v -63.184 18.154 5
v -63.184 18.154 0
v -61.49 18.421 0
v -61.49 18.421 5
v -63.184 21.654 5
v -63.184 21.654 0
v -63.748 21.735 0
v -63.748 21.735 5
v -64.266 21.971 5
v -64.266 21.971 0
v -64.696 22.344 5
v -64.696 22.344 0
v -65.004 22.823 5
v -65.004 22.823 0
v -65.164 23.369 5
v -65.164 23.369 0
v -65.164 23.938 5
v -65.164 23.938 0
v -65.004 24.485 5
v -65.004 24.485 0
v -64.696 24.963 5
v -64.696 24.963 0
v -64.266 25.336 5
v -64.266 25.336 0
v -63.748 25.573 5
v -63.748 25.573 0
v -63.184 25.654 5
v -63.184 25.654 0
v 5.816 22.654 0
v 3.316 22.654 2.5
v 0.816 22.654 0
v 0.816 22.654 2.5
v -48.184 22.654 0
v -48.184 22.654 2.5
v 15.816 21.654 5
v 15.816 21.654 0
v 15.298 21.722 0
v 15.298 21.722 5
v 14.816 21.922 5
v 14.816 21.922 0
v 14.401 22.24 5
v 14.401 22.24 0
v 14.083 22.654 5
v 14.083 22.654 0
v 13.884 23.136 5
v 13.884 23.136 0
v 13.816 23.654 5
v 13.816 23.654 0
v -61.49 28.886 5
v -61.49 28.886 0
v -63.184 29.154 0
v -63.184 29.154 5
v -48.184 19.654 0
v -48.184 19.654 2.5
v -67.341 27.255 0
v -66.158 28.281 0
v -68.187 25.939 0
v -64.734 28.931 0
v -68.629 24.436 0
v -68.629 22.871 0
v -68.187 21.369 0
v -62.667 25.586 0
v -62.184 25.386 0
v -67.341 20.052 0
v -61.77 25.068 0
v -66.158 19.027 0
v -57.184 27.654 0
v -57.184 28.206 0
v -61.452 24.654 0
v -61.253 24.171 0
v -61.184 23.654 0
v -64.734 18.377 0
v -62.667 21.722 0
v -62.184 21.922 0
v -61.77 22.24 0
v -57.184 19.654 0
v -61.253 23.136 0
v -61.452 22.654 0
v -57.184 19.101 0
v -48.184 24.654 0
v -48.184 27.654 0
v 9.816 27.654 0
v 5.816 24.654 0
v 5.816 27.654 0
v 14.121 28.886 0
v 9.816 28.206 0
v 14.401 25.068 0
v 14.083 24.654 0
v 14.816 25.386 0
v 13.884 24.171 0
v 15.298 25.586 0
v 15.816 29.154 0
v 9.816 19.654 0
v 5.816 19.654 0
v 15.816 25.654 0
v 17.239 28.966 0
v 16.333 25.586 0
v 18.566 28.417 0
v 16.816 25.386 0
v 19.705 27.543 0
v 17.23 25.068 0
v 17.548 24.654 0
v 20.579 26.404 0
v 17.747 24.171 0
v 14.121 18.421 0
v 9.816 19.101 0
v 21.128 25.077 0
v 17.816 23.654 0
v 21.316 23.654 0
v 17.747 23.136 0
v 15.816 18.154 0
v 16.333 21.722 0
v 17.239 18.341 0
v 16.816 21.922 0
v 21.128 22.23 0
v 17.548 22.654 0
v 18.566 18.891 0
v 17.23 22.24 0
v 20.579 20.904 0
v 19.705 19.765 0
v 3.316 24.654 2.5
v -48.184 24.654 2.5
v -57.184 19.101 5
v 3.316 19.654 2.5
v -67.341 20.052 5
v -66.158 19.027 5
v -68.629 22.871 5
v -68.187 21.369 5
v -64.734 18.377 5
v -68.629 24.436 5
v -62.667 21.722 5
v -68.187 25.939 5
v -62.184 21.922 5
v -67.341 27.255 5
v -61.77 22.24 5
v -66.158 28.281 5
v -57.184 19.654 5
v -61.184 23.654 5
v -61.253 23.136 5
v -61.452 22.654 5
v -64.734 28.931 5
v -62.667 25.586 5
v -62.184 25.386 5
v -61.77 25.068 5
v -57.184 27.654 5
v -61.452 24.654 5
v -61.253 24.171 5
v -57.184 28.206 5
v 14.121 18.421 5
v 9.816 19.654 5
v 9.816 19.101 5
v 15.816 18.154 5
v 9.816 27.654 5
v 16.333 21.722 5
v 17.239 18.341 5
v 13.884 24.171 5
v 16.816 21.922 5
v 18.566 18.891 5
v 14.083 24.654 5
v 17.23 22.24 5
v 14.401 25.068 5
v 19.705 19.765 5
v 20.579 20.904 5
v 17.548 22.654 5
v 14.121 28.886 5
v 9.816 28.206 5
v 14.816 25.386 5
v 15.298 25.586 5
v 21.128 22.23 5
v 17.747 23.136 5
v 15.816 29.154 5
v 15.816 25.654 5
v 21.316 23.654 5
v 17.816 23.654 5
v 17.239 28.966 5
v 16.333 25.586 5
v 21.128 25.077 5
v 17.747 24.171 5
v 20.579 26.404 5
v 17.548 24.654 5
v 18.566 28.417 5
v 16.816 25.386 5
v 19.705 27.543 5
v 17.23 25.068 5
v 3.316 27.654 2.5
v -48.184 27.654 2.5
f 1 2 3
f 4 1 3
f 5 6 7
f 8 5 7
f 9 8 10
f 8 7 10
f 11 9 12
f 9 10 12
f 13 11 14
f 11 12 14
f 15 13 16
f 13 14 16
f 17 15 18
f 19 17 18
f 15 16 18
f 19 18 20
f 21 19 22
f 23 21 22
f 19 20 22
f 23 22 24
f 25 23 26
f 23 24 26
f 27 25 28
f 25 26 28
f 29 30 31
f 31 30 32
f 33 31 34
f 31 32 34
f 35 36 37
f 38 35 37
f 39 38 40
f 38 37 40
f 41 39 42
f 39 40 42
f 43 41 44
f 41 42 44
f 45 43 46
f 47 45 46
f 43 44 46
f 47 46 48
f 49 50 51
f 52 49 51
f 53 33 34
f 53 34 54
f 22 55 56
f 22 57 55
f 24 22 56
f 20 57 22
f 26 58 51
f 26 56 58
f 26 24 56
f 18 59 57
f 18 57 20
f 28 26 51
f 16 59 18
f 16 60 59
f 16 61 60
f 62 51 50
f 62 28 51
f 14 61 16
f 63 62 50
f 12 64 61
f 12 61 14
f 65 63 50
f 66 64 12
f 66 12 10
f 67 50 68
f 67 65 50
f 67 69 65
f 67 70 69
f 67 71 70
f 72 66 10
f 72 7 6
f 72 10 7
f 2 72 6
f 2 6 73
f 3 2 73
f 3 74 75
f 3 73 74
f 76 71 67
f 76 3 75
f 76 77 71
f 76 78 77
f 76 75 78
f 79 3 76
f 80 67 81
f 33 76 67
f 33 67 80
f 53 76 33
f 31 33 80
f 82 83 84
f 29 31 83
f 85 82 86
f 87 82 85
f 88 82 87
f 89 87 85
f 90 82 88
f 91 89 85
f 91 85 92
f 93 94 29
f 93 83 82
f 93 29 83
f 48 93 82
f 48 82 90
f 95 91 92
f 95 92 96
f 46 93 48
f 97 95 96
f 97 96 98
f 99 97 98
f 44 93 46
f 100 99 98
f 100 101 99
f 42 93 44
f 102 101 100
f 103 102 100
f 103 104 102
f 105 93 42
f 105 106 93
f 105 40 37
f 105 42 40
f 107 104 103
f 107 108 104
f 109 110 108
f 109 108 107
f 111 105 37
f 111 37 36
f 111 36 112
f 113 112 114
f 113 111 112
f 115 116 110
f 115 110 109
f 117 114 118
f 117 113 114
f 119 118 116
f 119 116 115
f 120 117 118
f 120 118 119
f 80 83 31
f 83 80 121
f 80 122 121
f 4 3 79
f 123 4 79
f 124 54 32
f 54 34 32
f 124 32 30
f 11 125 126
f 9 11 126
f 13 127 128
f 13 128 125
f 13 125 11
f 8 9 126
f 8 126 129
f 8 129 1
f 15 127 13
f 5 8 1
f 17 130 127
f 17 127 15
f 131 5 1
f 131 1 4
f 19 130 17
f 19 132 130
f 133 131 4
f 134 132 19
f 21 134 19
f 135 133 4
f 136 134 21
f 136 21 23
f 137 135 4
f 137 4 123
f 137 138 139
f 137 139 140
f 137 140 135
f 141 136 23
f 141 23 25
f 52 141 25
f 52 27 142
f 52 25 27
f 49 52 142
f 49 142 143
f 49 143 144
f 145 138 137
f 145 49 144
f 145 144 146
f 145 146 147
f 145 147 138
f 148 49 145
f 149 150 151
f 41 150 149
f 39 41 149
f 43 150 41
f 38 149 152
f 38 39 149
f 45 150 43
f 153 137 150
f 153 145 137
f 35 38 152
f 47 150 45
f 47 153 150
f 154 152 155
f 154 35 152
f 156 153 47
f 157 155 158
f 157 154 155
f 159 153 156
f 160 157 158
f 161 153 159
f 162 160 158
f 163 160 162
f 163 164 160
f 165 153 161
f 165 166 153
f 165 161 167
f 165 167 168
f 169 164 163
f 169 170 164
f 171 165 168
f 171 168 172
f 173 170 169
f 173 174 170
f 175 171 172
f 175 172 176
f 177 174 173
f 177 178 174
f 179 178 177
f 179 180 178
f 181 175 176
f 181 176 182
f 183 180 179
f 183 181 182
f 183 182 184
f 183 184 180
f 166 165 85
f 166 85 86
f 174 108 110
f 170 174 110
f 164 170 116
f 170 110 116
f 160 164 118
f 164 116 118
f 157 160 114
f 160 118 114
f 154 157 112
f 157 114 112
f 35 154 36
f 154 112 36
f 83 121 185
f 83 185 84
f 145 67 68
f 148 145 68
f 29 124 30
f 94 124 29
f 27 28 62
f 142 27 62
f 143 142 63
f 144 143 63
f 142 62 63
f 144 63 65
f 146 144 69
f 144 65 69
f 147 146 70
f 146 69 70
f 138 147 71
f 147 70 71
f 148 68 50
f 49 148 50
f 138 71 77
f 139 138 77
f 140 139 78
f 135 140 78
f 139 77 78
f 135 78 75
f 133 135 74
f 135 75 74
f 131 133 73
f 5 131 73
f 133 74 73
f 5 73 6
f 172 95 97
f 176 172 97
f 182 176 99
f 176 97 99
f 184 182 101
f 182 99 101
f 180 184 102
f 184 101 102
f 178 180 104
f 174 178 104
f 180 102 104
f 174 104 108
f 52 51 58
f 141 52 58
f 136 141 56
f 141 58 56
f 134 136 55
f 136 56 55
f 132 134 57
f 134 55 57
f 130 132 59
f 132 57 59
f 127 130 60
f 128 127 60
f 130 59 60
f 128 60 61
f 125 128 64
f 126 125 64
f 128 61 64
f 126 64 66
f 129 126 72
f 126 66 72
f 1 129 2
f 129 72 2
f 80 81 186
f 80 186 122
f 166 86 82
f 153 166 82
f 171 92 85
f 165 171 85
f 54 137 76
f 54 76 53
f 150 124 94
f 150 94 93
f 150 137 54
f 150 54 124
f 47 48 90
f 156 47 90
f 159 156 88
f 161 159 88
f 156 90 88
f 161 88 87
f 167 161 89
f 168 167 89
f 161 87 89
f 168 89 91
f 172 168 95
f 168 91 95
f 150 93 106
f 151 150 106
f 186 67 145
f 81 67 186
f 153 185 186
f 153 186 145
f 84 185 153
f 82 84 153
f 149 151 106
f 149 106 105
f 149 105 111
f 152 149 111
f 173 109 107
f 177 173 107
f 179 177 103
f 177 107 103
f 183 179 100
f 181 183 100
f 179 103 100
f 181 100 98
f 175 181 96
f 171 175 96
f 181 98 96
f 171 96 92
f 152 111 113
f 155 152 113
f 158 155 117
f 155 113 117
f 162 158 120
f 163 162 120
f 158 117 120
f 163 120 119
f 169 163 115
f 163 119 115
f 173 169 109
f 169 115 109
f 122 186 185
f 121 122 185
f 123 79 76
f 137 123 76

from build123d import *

# Parameters (mm, degrees)
F0_W         = 60
F0_H         = 2
F1_DEPTH     = 5
F2_W         = 9
F2_H         = 3
F3_DEPTH     = 5
F4_W         = 49
F4_H         = 3
F5_DEPTH     = 2.5
F6_T4_DEPTH  = 15.8584149398
F6_T9_DEPTH  = 28.7168298797
F6_T15_DEPTH = 28.7168298797
F6_T21_DEPTH = 15.8584149398


# Not quite as in the source:
# - a fillet or chamfer that OpenCascade refuses, or shapes differently, is made with other operations: its cross-section is extruded or revolved along the edge and cut away or added


with BuildPart() as f1:
    # F0 (on Top) → F1 (new body)
    with BuildSketch(Plane.XY):
        with BuildLine():
            ThreePointArc((21.3155073225, 23.6537444443), (19.7045946191, 27.5428317408), (15.8155073225, 29.1537444443))
            Line((15.8155073225, 29.1537444443), (15.8155073225, 25.6537444443))
            ThreePointArc((15.8155073225, 25.6537444443), (17.2297208849, 25.0679580066), (17.8155073225, 23.6537444443))
            ThreePointArc((17.8155073225, 23.6537444443), (17.2297208849, 22.2395308819), (15.8155073225, 21.6537444443))
            Line((15.8155073225, 21.6537444443), (15.8155073225, 18.1537444443))
            ThreePointArc((15.8155073225, 18.1537444443), (19.7045946191, 19.7646571477), (21.3155073225, 23.6537444443))
        make_face()
        with BuildLine():
            Line((15.8155073225, 29.1537444443), (14.120912728, 28.8861768767))
            ThreePointArc((14.120912728, 28.8861768767), (11.3674588589, 26.8886887815), (10.3155073225, 23.6537444443))
            Line((10.3155073225, 23.6537444443), (13.8155073225, 23.6537444443))
            ThreePointArc((13.8155073225, 23.6537444443), (14.4012937602, 25.0679580066), (15.8155073225, 25.6537444443))
            Line((15.8155073225, 25.6537444443), (15.8155073225, 29.1537444443))
        make_face()
        with BuildLine():
            Line((13.8155073225, 23.6537444443), (10.3155073225, 23.6537444443))
            ThreePointArc((10.3155073225, 23.6537444443), (11.3674588589, 20.418800107), (14.120912728, 18.4213120118))
            Line((14.120912728, 18.4213120118), (15.8155073225, 18.1537444443))
            Line((15.8155073225, 18.1537444443), (15.8155073225, 21.6537444443))
            ThreePointArc((15.8155073225, 21.6537444443), (14.4012937602, 22.2395308819), (13.8155073225, 23.6537444443))
        make_face()
        with BuildLine():
            Line((14.120912728, 28.8861768767), (9.8155073225, 28.2063760232))
            Line((9.8155073225, 28.2063760232), (9.8155073225, 24.6537444443))
            Line((9.8155073225, 24.6537444443), (9.8155073225, 23.6537444443))
            Line((9.8155073225, 23.6537444443), (10.3155073225, 23.6537444443))
            ThreePointArc((10.3155073225, 23.6537444443), (11.3674588589, 26.8886887815), (14.120912728, 28.8861768767))
        make_face()
        with BuildLine():
            Line((10.3155073225, 23.6537444443), (9.8155073225, 23.6537444443))
            Line((9.8155073225, 23.6537444443), (9.8155073225, 22.6537444443))
            Line((9.8155073225, 22.6537444443), (9.8155073225, 19.1011128653))
            Line((9.8155073225, 19.1011128653), (14.120912728, 18.4213120118))
            ThreePointArc((14.120912728, 18.4213120118), (11.3674588589, 20.418800107), (10.3155073225, 23.6537444443))
        make_face()
        with Locations((-23.6844926775, 23.6537444443)):
            Rectangle(F0_W, F0_H)
        Polygon((9.8155073225, 24.6537444443), (6.3155073225, 24.6537444443), (6.3155073225, 22.6537444443), (9.8155073225, 22.6537444443), (9.8155073225, 23.6537444443), align=None)
        with BuildLine():
            ThreePointArc((-57.6844926775, 23.6537444443), (-58.7364442138, 26.8886887815), (-61.4898980829, 28.8861768767))
            Line((-61.4898980829, 28.8861768767), (-63.1844926775, 29.1537444443))
            Line((-63.1844926775, 29.1537444443), (-63.1844926775, 25.6537444443))
            ThreePointArc((-63.1844926775, 25.6537444443), (-61.7702791151, 25.0679580066), (-61.1844926775, 23.6537444443))
            Line((-61.1844926775, 23.6537444443), (-57.6844926775, 23.6537444443))
        make_face()
        with BuildLine():
            ThreePointArc((-61.4898980829, 18.4213120118), (-58.7364442138, 20.418800107), (-57.6844926775, 23.6537444443))
            Line((-57.6844926775, 23.6537444443), (-61.1844926775, 23.6537444443))
            ThreePointArc((-61.1844926775, 23.6537444443), (-61.7702791151, 22.2395308819), (-63.1844926775, 21.6537444443))
            Line((-63.1844926775, 21.6537444443), (-63.1844926775, 18.1537444443))
            Line((-63.1844926775, 18.1537444443), (-61.4898980829, 18.4213120118))
        make_face()
        with BuildLine():
            Line((-63.1844926775, 25.6537444443), (-63.1844926775, 29.1537444443))
            ThreePointArc((-63.1844926775, 29.1537444443), (-68.6844926775, 23.6537444443), (-63.1844926775, 18.1537444443))
            Line((-63.1844926775, 18.1537444443), (-63.1844926775, 21.6537444443))
            ThreePointArc((-63.1844926775, 21.6537444443), (-65.1844926775, 23.6537444443), (-63.1844926775, 25.6537444443))
        make_face()
        with BuildLine():
            Line((-57.1844926775, 24.6537444443), (-57.1844926775, 28.2063760232))
            Line((-57.1844926775, 28.2063760232), (-61.4898980829, 28.8861768767))
            ThreePointArc((-61.4898980829, 28.8861768767), (-58.7364442138, 26.8886887815), (-57.6844926775, 23.6537444443))
            Line((-57.6844926775, 23.6537444443), (-57.1844926775, 23.6537444443))
            Line((-57.1844926775, 23.6537444443), (-57.1844926775, 24.6537444443))
        make_face()
        with BuildLine():
            Line((-57.1844926775, 22.6537444443), (-57.1844926775, 23.6537444443))
            Line((-57.1844926775, 23.6537444443), (-57.6844926775, 23.6537444443))
            ThreePointArc((-57.6844926775, 23.6537444443), (-58.7364442138, 20.418800107), (-61.4898980829, 18.4213120118))
            Line((-61.4898980829, 18.4213120118), (-57.1844926775, 19.1011128653))
            Line((-57.1844926775, 19.1011128653), (-57.1844926775, 22.6537444443))
        make_face()
        Polygon((-53.6844926775, 22.6537444443), (-53.6844926775, 24.6537444443), (-57.1844926775, 24.6537444443), (-57.1844926775, 23.6537444443), (-57.1844926775, 22.6537444443), align=None)
    extrude(amount=F1_DEPTH)

    # F2 (on face) → F3 (join)
    with BuildSketch(Plane(origin=(0, 0, 0), x_dir=(1, 0, 0), z_dir=(0, 0, -1))):
        with Locations((5.3155073225, -21.1537444443)):
            Rectangle(F2_W, F2_H)
        with Locations((5.3155073225, -26.1537444443)):
            Rectangle(F2_W, F2_H)
        with Locations((-52.6844926775, -21.1537444443)):
            Rectangle(F2_W, F2_H)
        with Locations((-52.6844926775, -26.1537444443)):
            Rectangle(F2_W, F2_H)
    extrude(amount=-F3_DEPTH)

    # F4 (on face) → F5 (join)
    with BuildSketch(Plane.XY.offset(5)):
        with Locations((-23.6844926775, 21.1537444443)):
            Rectangle(F4_W, F4_H)
        with Locations((-23.6844926775, 26.1537444443)):
            Rectangle(F4_W, F4_H)
    extrude(amount=-F5_DEPTH)

    # F6: chamfer of 5 on 2 edges, made by hand


with BuildPart() as f6_tool2:
    # F6_s3 → F6_t4 (new body)
    with BuildSketch(Plane.XZ.offset(-6.7953295044)):
        Polygon((0.8155073225, 5), (5.8155073225, 0), (0.8155073225, 0), align=None)
    extrude(amount=-F6_T4_DEPTH)

    split(bisect_by=Plane.XY.offset(2.5), keep=Keep.BOTTOM)


with BuildPart() as f1_1:
    add(f1.part)

    # F6_t1: cut F6_tool2
    add(f6_tool2.part, mode=Mode.SUBTRACT)


with BuildPart() as f6_tool7:
    # F6_s8 → F6_t9 (new body)
    with BuildSketch(Plane.XZ.offset(-6.7953295044)):
        Polygon((0.8155073225, 5), (5.8155073225, 0), (0.8155073225, 0), align=None)
    extrude(amount=-F6_T9_DEPTH)

    split(bisect_by=Plane.XY.offset(2.5), keep=Keep.BOTTOM)

    split(bisect_by=Plane.XZ.offset(-24.6537444443), keep=Keep.BOTTOM)


with BuildPart() as f1_2:
    add(f1_1.part)

    # F6_t6: cut F6_tool7
    add(f6_tool7.part, mode=Mode.SUBTRACT)


with BuildPart() as f6_tool13:
    # F6_s14 → F6_t15 (new body)
    with BuildSketch(Plane.XZ.offset(-11.7953295044)):
        Polygon((0.8155073225, 5), (5.8155073225, 0), (0.8155073225, 0), align=None)
    extrude(amount=-F6_T15_DEPTH)

    split(bisect_by=Plane.XZ.offset(-22.6537444443), keep=Keep.TOP)

    split(bisect_by=Plane.XY.offset(2.5), keep=Keep.BOTTOM)


with BuildPart() as f1_3:
    add(f1_2.part)

    # F6_t12: cut F6_tool13
    add(f6_tool13.part, mode=Mode.SUBTRACT)


with BuildPart() as f6_tool19:
    # F6_s20 → F6_t21 (new body)
    with BuildSketch(Plane.XZ.offset(-24.6537444443)):
        Polygon((0.8155073225, 5), (5.8155073225, 0), (0.8155073225, 0), align=None)
    extrude(amount=-F6_T21_DEPTH)

    split(bisect_by=Plane.XY.offset(2.5), keep=Keep.BOTTOM)


with BuildPart() as f1_4:
    add(f1_3.part)

    # F6_t18: cut F6_tool19
    add(f6_tool19.part, mode=Mode.SUBTRACT)


solid = f1_4.part
